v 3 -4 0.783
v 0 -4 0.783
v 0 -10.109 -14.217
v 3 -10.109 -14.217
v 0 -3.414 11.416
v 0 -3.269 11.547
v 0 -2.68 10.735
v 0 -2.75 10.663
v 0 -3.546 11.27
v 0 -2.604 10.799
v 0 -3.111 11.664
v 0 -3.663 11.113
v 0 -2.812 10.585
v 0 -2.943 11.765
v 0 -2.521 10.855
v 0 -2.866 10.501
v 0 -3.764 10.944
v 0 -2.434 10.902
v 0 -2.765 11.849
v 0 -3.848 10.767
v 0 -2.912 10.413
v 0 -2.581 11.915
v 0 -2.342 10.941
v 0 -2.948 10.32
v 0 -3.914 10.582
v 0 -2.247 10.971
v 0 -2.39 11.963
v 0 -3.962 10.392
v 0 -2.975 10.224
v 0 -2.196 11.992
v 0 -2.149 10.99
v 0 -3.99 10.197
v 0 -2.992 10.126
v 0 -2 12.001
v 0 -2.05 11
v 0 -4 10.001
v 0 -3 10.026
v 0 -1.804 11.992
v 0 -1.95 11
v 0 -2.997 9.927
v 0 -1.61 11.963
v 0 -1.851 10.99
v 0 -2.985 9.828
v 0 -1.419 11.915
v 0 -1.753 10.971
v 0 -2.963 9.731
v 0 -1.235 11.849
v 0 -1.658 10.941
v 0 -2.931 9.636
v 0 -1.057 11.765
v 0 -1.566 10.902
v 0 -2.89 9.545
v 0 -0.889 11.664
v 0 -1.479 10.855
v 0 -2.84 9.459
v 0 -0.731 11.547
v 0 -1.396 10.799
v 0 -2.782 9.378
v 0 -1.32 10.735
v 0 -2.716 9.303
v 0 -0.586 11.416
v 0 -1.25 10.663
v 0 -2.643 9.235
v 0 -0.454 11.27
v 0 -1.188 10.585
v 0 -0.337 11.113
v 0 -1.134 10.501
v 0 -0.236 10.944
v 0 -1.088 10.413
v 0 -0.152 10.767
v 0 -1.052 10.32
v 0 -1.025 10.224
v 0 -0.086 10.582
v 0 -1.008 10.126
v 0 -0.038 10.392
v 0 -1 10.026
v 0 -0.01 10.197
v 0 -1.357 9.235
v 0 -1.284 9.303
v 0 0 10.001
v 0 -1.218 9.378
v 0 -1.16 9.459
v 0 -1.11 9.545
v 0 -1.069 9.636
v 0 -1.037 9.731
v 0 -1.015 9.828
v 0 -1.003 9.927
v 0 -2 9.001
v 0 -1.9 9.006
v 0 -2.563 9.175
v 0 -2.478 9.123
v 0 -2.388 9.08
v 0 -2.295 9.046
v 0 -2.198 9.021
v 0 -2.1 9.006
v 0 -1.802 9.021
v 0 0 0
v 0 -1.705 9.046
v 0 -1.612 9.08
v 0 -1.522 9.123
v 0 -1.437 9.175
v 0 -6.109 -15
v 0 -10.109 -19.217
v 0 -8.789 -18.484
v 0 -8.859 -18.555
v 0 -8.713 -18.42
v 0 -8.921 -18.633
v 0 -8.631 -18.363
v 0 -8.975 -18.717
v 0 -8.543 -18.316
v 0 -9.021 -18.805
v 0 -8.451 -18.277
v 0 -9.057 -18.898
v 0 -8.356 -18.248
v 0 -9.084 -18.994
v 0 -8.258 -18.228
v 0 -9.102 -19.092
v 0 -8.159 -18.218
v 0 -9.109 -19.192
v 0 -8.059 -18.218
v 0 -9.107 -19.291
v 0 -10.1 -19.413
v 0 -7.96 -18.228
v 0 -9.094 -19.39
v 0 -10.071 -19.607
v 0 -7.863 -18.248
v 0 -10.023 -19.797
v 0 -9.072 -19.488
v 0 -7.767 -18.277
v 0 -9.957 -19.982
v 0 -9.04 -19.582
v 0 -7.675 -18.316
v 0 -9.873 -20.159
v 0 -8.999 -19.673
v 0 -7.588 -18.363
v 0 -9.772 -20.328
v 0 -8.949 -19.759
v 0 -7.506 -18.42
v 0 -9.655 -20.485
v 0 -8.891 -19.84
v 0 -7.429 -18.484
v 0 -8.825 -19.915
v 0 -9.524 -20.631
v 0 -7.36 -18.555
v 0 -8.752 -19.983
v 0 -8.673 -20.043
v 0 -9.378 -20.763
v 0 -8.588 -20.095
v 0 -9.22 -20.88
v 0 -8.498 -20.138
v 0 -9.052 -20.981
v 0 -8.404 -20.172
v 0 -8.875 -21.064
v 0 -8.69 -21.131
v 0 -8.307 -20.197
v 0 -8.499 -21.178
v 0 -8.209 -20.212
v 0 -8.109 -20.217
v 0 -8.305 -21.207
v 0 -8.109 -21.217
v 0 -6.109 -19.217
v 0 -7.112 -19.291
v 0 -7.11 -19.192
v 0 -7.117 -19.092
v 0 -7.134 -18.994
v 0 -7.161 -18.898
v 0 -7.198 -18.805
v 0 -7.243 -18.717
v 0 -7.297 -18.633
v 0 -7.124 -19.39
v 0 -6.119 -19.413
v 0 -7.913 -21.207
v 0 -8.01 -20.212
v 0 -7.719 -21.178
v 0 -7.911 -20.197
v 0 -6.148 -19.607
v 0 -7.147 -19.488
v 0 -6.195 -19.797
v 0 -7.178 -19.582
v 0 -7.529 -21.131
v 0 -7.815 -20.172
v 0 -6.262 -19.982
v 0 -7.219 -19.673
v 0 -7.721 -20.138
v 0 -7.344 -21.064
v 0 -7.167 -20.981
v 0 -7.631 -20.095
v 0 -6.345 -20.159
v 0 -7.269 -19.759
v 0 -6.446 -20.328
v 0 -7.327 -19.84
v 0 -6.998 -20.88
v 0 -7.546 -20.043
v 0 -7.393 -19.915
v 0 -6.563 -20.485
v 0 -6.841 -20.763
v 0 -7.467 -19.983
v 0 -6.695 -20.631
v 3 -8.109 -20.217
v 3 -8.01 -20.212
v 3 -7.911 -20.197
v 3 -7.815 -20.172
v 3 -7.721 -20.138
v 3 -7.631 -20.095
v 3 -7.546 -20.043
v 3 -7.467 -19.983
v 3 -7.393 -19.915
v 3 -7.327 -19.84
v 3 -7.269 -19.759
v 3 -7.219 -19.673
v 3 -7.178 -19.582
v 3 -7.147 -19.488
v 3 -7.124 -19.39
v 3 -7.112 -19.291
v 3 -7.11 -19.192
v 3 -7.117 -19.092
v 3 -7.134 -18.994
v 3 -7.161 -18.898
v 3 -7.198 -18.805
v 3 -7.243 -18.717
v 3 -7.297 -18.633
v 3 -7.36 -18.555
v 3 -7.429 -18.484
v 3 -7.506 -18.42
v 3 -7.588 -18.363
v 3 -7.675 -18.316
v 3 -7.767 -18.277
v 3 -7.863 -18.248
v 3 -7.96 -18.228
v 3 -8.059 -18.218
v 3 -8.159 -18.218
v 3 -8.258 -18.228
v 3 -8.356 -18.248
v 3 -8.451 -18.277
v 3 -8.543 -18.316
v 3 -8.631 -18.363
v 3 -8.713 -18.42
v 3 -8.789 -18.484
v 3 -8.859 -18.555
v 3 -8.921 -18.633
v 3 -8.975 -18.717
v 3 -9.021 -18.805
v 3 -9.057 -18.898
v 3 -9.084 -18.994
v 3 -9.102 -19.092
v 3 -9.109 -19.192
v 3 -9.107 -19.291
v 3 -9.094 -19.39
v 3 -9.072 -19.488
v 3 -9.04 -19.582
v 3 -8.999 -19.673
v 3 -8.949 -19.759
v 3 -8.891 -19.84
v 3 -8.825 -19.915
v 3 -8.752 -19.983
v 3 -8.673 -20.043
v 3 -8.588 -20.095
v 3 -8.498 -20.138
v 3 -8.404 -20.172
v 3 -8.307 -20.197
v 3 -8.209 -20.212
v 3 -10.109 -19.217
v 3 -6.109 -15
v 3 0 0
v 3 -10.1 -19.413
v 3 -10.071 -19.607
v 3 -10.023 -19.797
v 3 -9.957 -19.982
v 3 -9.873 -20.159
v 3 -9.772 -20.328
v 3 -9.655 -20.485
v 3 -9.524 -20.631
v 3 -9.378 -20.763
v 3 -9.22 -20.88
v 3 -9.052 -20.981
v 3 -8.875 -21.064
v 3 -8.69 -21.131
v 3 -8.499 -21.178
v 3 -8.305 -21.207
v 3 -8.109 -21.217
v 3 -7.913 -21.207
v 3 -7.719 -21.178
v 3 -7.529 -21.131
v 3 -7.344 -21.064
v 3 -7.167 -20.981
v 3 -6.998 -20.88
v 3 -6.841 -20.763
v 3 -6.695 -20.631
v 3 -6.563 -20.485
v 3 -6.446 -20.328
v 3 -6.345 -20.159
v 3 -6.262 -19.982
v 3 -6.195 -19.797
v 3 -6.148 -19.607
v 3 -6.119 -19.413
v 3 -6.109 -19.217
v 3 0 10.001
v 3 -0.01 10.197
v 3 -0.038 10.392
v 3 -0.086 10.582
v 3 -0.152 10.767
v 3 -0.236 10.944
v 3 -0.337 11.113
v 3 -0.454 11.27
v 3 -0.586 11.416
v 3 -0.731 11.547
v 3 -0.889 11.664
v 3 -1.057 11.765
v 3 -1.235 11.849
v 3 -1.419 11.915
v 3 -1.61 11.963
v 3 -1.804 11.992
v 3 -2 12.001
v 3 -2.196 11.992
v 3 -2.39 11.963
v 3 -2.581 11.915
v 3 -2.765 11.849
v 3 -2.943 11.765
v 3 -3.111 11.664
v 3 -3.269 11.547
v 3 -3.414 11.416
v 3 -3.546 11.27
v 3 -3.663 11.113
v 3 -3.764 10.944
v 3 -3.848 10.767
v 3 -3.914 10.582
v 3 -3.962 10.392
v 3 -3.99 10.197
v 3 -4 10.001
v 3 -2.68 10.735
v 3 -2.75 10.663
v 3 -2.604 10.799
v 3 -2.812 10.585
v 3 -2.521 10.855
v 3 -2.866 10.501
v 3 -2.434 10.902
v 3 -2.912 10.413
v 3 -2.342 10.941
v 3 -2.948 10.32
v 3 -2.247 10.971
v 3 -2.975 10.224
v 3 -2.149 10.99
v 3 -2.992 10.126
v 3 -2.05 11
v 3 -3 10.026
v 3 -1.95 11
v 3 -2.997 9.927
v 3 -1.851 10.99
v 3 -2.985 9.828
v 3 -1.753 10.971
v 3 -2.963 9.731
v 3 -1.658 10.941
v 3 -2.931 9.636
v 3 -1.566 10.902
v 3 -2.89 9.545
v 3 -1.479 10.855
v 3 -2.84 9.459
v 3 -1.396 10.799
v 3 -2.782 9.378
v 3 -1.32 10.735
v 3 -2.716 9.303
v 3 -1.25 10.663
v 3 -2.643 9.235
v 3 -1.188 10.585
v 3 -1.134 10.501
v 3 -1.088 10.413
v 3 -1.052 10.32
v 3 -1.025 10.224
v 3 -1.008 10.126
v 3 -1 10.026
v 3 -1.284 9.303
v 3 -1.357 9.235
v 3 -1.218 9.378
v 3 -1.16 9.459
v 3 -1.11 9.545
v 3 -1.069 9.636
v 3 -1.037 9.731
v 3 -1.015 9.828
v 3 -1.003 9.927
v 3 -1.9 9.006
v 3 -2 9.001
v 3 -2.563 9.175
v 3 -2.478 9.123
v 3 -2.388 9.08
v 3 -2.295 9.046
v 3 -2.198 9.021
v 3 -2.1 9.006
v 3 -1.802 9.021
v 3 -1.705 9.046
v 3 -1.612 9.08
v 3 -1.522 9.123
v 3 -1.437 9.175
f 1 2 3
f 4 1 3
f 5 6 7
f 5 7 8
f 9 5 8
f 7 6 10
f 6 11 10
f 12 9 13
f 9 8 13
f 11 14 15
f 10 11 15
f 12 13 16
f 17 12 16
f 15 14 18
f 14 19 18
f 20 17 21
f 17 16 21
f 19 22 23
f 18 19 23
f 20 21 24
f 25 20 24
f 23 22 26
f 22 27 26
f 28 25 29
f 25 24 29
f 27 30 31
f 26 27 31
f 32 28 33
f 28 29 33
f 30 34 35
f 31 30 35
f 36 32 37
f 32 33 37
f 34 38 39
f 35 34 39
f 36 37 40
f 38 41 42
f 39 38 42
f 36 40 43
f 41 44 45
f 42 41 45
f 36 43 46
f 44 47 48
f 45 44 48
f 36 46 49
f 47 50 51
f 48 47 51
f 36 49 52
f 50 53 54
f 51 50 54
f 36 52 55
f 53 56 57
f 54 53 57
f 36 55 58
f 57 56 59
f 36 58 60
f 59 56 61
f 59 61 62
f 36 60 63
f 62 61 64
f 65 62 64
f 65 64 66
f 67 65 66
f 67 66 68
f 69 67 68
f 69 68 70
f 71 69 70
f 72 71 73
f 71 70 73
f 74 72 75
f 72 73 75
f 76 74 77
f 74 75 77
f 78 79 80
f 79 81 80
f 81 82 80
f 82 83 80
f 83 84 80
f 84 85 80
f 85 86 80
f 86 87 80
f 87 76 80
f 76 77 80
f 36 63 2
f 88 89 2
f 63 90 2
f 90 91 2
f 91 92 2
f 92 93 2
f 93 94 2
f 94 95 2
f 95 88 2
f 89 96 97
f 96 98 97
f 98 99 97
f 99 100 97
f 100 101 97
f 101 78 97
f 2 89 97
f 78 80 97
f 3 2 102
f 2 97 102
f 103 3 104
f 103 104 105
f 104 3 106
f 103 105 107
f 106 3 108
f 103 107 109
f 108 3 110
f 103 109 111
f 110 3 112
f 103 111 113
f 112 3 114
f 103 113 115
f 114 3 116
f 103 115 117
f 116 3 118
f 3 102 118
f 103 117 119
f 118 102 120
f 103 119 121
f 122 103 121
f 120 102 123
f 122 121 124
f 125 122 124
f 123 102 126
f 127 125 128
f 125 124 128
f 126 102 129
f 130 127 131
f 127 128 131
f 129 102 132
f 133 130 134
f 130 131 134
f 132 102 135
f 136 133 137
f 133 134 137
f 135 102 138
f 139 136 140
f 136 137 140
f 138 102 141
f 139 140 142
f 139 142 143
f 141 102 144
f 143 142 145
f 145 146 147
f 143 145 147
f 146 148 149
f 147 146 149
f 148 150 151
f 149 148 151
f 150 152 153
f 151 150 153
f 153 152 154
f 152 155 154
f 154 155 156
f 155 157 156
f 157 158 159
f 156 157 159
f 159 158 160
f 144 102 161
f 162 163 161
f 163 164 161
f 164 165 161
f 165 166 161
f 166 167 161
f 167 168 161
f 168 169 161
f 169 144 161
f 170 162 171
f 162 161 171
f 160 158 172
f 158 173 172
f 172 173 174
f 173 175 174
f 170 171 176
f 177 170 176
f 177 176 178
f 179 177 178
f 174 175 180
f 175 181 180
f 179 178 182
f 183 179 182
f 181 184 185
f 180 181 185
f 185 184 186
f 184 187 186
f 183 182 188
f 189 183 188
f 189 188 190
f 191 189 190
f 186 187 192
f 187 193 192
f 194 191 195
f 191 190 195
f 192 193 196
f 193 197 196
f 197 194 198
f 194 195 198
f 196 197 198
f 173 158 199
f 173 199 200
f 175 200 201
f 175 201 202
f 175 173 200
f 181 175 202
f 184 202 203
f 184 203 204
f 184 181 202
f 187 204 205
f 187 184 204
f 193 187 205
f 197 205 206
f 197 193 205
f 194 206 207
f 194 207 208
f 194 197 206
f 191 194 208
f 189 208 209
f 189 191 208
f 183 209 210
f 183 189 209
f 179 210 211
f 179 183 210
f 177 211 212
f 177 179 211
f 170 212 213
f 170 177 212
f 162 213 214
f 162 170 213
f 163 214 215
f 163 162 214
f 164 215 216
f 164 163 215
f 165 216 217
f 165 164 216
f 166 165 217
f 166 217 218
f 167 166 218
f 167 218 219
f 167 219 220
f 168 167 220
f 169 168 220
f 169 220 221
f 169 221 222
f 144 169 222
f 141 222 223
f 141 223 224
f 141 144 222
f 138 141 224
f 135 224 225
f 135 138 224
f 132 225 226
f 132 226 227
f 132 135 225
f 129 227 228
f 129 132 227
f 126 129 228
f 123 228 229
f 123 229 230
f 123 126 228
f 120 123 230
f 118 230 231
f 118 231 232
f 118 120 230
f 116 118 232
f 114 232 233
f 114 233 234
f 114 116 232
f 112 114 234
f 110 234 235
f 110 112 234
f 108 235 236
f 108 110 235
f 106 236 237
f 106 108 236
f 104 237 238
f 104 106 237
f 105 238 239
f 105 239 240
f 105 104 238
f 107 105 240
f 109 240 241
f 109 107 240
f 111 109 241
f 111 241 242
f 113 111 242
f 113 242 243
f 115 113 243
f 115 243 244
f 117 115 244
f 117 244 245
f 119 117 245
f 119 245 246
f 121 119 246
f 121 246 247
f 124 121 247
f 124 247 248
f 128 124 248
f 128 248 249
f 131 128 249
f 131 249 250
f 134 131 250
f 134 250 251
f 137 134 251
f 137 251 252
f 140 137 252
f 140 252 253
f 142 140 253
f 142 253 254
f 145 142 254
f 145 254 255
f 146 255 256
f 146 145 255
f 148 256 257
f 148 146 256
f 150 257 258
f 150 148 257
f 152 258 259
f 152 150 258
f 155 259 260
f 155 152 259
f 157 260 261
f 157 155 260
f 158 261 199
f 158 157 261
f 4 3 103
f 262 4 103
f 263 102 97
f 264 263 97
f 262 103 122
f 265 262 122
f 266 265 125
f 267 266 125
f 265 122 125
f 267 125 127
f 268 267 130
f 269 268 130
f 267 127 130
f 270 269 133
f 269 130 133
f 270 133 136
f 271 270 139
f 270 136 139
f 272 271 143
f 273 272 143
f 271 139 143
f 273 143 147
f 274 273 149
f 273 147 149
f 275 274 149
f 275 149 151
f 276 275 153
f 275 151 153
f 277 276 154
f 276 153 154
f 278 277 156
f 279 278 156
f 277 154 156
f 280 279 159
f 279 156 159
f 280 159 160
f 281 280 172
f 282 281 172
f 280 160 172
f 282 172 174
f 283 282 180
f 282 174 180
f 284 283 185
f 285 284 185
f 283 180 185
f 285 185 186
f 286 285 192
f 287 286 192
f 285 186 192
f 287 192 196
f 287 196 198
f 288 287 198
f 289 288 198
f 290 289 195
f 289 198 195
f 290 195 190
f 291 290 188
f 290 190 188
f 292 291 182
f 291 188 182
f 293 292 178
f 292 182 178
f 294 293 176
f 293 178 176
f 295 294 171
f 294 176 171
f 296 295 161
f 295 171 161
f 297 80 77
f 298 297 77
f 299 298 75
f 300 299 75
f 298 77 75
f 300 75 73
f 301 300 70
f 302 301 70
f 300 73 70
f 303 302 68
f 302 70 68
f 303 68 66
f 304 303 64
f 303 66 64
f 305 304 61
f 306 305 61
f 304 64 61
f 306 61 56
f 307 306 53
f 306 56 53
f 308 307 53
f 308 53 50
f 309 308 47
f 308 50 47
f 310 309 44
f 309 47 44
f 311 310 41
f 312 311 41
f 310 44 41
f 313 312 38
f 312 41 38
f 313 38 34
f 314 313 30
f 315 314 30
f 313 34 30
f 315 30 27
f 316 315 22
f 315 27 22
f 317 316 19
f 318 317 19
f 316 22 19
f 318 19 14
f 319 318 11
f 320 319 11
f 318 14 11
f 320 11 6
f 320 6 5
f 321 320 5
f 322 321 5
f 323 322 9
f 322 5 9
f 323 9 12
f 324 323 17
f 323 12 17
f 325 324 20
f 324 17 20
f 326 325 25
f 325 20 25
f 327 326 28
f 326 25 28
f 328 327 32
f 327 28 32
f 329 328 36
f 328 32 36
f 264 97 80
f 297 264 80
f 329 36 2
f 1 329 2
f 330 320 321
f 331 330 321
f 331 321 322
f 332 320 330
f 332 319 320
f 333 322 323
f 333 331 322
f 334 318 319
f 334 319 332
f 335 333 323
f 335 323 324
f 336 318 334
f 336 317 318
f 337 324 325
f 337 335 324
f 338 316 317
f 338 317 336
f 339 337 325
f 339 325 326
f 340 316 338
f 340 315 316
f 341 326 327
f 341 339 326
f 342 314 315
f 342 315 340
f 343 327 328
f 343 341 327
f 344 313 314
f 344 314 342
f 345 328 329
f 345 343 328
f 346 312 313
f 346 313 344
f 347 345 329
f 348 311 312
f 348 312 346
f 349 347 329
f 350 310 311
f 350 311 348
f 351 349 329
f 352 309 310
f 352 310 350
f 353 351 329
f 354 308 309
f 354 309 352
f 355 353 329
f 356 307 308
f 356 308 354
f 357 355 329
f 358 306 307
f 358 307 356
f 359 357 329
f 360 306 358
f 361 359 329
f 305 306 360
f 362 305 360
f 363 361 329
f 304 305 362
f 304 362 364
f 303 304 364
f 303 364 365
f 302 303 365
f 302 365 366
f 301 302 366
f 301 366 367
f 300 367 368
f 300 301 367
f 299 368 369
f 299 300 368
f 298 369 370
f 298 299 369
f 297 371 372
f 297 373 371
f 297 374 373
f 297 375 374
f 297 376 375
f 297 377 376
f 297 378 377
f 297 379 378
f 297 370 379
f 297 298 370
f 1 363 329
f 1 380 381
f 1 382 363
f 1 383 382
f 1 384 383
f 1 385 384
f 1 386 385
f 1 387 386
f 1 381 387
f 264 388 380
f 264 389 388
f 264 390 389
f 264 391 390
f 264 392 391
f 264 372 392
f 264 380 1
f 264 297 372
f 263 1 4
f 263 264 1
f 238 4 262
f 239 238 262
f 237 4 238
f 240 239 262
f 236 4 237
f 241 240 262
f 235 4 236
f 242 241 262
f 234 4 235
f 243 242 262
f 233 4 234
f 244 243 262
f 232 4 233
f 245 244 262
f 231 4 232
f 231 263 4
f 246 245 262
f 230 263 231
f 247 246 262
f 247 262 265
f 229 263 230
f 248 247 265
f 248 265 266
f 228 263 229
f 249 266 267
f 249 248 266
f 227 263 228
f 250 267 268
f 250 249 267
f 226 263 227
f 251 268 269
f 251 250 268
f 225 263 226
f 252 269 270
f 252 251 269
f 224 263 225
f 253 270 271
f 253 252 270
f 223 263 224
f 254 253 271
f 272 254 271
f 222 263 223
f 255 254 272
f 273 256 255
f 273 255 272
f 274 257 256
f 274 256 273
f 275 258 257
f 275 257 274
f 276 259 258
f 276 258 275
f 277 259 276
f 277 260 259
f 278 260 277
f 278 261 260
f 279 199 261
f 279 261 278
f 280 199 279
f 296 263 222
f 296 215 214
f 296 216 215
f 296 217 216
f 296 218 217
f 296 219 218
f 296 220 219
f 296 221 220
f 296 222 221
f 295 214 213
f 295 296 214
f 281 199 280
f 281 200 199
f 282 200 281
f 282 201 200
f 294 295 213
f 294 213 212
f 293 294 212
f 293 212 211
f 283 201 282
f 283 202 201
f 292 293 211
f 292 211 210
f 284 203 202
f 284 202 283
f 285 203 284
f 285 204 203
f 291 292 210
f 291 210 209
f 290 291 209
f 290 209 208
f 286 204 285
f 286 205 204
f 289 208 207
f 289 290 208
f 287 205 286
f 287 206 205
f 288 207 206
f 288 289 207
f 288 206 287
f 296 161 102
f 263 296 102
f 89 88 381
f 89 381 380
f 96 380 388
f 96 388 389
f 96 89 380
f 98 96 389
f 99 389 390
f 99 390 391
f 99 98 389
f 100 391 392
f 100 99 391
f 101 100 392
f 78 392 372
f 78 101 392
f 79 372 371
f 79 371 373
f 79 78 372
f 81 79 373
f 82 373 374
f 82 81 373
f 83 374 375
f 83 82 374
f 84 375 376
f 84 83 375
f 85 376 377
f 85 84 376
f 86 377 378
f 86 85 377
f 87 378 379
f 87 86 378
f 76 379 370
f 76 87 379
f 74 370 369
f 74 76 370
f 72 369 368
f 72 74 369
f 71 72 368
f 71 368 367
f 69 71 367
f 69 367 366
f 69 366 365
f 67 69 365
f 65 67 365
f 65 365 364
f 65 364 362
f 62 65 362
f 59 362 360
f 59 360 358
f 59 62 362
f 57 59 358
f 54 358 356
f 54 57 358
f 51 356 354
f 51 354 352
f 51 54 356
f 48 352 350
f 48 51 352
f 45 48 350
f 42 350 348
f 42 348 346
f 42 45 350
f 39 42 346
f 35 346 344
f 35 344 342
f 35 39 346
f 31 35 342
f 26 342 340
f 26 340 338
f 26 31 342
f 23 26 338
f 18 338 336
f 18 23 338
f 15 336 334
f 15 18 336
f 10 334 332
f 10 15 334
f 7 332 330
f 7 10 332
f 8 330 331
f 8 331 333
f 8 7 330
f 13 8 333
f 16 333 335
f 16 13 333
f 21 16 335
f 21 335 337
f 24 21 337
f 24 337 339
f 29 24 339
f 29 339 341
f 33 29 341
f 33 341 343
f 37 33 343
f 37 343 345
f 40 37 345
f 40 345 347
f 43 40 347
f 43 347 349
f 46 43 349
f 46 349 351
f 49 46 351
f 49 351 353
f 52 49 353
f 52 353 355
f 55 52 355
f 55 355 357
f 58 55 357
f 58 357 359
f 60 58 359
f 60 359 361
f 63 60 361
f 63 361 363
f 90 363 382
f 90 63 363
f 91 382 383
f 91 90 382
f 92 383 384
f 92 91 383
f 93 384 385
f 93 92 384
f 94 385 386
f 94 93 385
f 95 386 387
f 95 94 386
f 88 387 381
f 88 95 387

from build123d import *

# Parameters (mm, degrees)
SKETCH2_R           = 1
BOSS_EXTRUDE1_DEPTH = 3


with BuildPart() as part:
    # Sketch2 → Boss-Extrude1 (new body)
    with BuildSketch(Plane(origin=(0, 0, 0), x_dir=(0, 0, -1), z_dir=(1, 0, 0))):
        with BuildLine():
            Line((19.216665357, -6.109306765), (15, -6.109306765))
            Line((15, -6.109306765), (0, 0))
            Line((0, 0), (-10.001460368, 0))
            ThreePointArc((-10.001460368, 0), (-12.001460368, -2), (-10.001460368, -4))
            Line((-10.001460368, -4), (-0.783334643, -4))
            Line((-0.783334643, -4), (14.216665357, -10.109306765))
            Line((14.216665357, -10.109306765), (19.216665357, -10.109306765))
            ThreePointArc((19.216665357, -10.109306765), (21.216665357, -8.109306765), (19.216665357, -6.109306765))
        make_face()
        with Locations((19.216665357, -8.109306765)):
            Circle(SKETCH2_R, mode=Mode.SUBTRACT)
        with Locations((-10.001460368, -2)):
            Circle(SKETCH2_R, mode=Mode.SUBTRACT)
    extrude(amount=BOSS_EXTRUDE1_DEPTH)


solid = part.part
